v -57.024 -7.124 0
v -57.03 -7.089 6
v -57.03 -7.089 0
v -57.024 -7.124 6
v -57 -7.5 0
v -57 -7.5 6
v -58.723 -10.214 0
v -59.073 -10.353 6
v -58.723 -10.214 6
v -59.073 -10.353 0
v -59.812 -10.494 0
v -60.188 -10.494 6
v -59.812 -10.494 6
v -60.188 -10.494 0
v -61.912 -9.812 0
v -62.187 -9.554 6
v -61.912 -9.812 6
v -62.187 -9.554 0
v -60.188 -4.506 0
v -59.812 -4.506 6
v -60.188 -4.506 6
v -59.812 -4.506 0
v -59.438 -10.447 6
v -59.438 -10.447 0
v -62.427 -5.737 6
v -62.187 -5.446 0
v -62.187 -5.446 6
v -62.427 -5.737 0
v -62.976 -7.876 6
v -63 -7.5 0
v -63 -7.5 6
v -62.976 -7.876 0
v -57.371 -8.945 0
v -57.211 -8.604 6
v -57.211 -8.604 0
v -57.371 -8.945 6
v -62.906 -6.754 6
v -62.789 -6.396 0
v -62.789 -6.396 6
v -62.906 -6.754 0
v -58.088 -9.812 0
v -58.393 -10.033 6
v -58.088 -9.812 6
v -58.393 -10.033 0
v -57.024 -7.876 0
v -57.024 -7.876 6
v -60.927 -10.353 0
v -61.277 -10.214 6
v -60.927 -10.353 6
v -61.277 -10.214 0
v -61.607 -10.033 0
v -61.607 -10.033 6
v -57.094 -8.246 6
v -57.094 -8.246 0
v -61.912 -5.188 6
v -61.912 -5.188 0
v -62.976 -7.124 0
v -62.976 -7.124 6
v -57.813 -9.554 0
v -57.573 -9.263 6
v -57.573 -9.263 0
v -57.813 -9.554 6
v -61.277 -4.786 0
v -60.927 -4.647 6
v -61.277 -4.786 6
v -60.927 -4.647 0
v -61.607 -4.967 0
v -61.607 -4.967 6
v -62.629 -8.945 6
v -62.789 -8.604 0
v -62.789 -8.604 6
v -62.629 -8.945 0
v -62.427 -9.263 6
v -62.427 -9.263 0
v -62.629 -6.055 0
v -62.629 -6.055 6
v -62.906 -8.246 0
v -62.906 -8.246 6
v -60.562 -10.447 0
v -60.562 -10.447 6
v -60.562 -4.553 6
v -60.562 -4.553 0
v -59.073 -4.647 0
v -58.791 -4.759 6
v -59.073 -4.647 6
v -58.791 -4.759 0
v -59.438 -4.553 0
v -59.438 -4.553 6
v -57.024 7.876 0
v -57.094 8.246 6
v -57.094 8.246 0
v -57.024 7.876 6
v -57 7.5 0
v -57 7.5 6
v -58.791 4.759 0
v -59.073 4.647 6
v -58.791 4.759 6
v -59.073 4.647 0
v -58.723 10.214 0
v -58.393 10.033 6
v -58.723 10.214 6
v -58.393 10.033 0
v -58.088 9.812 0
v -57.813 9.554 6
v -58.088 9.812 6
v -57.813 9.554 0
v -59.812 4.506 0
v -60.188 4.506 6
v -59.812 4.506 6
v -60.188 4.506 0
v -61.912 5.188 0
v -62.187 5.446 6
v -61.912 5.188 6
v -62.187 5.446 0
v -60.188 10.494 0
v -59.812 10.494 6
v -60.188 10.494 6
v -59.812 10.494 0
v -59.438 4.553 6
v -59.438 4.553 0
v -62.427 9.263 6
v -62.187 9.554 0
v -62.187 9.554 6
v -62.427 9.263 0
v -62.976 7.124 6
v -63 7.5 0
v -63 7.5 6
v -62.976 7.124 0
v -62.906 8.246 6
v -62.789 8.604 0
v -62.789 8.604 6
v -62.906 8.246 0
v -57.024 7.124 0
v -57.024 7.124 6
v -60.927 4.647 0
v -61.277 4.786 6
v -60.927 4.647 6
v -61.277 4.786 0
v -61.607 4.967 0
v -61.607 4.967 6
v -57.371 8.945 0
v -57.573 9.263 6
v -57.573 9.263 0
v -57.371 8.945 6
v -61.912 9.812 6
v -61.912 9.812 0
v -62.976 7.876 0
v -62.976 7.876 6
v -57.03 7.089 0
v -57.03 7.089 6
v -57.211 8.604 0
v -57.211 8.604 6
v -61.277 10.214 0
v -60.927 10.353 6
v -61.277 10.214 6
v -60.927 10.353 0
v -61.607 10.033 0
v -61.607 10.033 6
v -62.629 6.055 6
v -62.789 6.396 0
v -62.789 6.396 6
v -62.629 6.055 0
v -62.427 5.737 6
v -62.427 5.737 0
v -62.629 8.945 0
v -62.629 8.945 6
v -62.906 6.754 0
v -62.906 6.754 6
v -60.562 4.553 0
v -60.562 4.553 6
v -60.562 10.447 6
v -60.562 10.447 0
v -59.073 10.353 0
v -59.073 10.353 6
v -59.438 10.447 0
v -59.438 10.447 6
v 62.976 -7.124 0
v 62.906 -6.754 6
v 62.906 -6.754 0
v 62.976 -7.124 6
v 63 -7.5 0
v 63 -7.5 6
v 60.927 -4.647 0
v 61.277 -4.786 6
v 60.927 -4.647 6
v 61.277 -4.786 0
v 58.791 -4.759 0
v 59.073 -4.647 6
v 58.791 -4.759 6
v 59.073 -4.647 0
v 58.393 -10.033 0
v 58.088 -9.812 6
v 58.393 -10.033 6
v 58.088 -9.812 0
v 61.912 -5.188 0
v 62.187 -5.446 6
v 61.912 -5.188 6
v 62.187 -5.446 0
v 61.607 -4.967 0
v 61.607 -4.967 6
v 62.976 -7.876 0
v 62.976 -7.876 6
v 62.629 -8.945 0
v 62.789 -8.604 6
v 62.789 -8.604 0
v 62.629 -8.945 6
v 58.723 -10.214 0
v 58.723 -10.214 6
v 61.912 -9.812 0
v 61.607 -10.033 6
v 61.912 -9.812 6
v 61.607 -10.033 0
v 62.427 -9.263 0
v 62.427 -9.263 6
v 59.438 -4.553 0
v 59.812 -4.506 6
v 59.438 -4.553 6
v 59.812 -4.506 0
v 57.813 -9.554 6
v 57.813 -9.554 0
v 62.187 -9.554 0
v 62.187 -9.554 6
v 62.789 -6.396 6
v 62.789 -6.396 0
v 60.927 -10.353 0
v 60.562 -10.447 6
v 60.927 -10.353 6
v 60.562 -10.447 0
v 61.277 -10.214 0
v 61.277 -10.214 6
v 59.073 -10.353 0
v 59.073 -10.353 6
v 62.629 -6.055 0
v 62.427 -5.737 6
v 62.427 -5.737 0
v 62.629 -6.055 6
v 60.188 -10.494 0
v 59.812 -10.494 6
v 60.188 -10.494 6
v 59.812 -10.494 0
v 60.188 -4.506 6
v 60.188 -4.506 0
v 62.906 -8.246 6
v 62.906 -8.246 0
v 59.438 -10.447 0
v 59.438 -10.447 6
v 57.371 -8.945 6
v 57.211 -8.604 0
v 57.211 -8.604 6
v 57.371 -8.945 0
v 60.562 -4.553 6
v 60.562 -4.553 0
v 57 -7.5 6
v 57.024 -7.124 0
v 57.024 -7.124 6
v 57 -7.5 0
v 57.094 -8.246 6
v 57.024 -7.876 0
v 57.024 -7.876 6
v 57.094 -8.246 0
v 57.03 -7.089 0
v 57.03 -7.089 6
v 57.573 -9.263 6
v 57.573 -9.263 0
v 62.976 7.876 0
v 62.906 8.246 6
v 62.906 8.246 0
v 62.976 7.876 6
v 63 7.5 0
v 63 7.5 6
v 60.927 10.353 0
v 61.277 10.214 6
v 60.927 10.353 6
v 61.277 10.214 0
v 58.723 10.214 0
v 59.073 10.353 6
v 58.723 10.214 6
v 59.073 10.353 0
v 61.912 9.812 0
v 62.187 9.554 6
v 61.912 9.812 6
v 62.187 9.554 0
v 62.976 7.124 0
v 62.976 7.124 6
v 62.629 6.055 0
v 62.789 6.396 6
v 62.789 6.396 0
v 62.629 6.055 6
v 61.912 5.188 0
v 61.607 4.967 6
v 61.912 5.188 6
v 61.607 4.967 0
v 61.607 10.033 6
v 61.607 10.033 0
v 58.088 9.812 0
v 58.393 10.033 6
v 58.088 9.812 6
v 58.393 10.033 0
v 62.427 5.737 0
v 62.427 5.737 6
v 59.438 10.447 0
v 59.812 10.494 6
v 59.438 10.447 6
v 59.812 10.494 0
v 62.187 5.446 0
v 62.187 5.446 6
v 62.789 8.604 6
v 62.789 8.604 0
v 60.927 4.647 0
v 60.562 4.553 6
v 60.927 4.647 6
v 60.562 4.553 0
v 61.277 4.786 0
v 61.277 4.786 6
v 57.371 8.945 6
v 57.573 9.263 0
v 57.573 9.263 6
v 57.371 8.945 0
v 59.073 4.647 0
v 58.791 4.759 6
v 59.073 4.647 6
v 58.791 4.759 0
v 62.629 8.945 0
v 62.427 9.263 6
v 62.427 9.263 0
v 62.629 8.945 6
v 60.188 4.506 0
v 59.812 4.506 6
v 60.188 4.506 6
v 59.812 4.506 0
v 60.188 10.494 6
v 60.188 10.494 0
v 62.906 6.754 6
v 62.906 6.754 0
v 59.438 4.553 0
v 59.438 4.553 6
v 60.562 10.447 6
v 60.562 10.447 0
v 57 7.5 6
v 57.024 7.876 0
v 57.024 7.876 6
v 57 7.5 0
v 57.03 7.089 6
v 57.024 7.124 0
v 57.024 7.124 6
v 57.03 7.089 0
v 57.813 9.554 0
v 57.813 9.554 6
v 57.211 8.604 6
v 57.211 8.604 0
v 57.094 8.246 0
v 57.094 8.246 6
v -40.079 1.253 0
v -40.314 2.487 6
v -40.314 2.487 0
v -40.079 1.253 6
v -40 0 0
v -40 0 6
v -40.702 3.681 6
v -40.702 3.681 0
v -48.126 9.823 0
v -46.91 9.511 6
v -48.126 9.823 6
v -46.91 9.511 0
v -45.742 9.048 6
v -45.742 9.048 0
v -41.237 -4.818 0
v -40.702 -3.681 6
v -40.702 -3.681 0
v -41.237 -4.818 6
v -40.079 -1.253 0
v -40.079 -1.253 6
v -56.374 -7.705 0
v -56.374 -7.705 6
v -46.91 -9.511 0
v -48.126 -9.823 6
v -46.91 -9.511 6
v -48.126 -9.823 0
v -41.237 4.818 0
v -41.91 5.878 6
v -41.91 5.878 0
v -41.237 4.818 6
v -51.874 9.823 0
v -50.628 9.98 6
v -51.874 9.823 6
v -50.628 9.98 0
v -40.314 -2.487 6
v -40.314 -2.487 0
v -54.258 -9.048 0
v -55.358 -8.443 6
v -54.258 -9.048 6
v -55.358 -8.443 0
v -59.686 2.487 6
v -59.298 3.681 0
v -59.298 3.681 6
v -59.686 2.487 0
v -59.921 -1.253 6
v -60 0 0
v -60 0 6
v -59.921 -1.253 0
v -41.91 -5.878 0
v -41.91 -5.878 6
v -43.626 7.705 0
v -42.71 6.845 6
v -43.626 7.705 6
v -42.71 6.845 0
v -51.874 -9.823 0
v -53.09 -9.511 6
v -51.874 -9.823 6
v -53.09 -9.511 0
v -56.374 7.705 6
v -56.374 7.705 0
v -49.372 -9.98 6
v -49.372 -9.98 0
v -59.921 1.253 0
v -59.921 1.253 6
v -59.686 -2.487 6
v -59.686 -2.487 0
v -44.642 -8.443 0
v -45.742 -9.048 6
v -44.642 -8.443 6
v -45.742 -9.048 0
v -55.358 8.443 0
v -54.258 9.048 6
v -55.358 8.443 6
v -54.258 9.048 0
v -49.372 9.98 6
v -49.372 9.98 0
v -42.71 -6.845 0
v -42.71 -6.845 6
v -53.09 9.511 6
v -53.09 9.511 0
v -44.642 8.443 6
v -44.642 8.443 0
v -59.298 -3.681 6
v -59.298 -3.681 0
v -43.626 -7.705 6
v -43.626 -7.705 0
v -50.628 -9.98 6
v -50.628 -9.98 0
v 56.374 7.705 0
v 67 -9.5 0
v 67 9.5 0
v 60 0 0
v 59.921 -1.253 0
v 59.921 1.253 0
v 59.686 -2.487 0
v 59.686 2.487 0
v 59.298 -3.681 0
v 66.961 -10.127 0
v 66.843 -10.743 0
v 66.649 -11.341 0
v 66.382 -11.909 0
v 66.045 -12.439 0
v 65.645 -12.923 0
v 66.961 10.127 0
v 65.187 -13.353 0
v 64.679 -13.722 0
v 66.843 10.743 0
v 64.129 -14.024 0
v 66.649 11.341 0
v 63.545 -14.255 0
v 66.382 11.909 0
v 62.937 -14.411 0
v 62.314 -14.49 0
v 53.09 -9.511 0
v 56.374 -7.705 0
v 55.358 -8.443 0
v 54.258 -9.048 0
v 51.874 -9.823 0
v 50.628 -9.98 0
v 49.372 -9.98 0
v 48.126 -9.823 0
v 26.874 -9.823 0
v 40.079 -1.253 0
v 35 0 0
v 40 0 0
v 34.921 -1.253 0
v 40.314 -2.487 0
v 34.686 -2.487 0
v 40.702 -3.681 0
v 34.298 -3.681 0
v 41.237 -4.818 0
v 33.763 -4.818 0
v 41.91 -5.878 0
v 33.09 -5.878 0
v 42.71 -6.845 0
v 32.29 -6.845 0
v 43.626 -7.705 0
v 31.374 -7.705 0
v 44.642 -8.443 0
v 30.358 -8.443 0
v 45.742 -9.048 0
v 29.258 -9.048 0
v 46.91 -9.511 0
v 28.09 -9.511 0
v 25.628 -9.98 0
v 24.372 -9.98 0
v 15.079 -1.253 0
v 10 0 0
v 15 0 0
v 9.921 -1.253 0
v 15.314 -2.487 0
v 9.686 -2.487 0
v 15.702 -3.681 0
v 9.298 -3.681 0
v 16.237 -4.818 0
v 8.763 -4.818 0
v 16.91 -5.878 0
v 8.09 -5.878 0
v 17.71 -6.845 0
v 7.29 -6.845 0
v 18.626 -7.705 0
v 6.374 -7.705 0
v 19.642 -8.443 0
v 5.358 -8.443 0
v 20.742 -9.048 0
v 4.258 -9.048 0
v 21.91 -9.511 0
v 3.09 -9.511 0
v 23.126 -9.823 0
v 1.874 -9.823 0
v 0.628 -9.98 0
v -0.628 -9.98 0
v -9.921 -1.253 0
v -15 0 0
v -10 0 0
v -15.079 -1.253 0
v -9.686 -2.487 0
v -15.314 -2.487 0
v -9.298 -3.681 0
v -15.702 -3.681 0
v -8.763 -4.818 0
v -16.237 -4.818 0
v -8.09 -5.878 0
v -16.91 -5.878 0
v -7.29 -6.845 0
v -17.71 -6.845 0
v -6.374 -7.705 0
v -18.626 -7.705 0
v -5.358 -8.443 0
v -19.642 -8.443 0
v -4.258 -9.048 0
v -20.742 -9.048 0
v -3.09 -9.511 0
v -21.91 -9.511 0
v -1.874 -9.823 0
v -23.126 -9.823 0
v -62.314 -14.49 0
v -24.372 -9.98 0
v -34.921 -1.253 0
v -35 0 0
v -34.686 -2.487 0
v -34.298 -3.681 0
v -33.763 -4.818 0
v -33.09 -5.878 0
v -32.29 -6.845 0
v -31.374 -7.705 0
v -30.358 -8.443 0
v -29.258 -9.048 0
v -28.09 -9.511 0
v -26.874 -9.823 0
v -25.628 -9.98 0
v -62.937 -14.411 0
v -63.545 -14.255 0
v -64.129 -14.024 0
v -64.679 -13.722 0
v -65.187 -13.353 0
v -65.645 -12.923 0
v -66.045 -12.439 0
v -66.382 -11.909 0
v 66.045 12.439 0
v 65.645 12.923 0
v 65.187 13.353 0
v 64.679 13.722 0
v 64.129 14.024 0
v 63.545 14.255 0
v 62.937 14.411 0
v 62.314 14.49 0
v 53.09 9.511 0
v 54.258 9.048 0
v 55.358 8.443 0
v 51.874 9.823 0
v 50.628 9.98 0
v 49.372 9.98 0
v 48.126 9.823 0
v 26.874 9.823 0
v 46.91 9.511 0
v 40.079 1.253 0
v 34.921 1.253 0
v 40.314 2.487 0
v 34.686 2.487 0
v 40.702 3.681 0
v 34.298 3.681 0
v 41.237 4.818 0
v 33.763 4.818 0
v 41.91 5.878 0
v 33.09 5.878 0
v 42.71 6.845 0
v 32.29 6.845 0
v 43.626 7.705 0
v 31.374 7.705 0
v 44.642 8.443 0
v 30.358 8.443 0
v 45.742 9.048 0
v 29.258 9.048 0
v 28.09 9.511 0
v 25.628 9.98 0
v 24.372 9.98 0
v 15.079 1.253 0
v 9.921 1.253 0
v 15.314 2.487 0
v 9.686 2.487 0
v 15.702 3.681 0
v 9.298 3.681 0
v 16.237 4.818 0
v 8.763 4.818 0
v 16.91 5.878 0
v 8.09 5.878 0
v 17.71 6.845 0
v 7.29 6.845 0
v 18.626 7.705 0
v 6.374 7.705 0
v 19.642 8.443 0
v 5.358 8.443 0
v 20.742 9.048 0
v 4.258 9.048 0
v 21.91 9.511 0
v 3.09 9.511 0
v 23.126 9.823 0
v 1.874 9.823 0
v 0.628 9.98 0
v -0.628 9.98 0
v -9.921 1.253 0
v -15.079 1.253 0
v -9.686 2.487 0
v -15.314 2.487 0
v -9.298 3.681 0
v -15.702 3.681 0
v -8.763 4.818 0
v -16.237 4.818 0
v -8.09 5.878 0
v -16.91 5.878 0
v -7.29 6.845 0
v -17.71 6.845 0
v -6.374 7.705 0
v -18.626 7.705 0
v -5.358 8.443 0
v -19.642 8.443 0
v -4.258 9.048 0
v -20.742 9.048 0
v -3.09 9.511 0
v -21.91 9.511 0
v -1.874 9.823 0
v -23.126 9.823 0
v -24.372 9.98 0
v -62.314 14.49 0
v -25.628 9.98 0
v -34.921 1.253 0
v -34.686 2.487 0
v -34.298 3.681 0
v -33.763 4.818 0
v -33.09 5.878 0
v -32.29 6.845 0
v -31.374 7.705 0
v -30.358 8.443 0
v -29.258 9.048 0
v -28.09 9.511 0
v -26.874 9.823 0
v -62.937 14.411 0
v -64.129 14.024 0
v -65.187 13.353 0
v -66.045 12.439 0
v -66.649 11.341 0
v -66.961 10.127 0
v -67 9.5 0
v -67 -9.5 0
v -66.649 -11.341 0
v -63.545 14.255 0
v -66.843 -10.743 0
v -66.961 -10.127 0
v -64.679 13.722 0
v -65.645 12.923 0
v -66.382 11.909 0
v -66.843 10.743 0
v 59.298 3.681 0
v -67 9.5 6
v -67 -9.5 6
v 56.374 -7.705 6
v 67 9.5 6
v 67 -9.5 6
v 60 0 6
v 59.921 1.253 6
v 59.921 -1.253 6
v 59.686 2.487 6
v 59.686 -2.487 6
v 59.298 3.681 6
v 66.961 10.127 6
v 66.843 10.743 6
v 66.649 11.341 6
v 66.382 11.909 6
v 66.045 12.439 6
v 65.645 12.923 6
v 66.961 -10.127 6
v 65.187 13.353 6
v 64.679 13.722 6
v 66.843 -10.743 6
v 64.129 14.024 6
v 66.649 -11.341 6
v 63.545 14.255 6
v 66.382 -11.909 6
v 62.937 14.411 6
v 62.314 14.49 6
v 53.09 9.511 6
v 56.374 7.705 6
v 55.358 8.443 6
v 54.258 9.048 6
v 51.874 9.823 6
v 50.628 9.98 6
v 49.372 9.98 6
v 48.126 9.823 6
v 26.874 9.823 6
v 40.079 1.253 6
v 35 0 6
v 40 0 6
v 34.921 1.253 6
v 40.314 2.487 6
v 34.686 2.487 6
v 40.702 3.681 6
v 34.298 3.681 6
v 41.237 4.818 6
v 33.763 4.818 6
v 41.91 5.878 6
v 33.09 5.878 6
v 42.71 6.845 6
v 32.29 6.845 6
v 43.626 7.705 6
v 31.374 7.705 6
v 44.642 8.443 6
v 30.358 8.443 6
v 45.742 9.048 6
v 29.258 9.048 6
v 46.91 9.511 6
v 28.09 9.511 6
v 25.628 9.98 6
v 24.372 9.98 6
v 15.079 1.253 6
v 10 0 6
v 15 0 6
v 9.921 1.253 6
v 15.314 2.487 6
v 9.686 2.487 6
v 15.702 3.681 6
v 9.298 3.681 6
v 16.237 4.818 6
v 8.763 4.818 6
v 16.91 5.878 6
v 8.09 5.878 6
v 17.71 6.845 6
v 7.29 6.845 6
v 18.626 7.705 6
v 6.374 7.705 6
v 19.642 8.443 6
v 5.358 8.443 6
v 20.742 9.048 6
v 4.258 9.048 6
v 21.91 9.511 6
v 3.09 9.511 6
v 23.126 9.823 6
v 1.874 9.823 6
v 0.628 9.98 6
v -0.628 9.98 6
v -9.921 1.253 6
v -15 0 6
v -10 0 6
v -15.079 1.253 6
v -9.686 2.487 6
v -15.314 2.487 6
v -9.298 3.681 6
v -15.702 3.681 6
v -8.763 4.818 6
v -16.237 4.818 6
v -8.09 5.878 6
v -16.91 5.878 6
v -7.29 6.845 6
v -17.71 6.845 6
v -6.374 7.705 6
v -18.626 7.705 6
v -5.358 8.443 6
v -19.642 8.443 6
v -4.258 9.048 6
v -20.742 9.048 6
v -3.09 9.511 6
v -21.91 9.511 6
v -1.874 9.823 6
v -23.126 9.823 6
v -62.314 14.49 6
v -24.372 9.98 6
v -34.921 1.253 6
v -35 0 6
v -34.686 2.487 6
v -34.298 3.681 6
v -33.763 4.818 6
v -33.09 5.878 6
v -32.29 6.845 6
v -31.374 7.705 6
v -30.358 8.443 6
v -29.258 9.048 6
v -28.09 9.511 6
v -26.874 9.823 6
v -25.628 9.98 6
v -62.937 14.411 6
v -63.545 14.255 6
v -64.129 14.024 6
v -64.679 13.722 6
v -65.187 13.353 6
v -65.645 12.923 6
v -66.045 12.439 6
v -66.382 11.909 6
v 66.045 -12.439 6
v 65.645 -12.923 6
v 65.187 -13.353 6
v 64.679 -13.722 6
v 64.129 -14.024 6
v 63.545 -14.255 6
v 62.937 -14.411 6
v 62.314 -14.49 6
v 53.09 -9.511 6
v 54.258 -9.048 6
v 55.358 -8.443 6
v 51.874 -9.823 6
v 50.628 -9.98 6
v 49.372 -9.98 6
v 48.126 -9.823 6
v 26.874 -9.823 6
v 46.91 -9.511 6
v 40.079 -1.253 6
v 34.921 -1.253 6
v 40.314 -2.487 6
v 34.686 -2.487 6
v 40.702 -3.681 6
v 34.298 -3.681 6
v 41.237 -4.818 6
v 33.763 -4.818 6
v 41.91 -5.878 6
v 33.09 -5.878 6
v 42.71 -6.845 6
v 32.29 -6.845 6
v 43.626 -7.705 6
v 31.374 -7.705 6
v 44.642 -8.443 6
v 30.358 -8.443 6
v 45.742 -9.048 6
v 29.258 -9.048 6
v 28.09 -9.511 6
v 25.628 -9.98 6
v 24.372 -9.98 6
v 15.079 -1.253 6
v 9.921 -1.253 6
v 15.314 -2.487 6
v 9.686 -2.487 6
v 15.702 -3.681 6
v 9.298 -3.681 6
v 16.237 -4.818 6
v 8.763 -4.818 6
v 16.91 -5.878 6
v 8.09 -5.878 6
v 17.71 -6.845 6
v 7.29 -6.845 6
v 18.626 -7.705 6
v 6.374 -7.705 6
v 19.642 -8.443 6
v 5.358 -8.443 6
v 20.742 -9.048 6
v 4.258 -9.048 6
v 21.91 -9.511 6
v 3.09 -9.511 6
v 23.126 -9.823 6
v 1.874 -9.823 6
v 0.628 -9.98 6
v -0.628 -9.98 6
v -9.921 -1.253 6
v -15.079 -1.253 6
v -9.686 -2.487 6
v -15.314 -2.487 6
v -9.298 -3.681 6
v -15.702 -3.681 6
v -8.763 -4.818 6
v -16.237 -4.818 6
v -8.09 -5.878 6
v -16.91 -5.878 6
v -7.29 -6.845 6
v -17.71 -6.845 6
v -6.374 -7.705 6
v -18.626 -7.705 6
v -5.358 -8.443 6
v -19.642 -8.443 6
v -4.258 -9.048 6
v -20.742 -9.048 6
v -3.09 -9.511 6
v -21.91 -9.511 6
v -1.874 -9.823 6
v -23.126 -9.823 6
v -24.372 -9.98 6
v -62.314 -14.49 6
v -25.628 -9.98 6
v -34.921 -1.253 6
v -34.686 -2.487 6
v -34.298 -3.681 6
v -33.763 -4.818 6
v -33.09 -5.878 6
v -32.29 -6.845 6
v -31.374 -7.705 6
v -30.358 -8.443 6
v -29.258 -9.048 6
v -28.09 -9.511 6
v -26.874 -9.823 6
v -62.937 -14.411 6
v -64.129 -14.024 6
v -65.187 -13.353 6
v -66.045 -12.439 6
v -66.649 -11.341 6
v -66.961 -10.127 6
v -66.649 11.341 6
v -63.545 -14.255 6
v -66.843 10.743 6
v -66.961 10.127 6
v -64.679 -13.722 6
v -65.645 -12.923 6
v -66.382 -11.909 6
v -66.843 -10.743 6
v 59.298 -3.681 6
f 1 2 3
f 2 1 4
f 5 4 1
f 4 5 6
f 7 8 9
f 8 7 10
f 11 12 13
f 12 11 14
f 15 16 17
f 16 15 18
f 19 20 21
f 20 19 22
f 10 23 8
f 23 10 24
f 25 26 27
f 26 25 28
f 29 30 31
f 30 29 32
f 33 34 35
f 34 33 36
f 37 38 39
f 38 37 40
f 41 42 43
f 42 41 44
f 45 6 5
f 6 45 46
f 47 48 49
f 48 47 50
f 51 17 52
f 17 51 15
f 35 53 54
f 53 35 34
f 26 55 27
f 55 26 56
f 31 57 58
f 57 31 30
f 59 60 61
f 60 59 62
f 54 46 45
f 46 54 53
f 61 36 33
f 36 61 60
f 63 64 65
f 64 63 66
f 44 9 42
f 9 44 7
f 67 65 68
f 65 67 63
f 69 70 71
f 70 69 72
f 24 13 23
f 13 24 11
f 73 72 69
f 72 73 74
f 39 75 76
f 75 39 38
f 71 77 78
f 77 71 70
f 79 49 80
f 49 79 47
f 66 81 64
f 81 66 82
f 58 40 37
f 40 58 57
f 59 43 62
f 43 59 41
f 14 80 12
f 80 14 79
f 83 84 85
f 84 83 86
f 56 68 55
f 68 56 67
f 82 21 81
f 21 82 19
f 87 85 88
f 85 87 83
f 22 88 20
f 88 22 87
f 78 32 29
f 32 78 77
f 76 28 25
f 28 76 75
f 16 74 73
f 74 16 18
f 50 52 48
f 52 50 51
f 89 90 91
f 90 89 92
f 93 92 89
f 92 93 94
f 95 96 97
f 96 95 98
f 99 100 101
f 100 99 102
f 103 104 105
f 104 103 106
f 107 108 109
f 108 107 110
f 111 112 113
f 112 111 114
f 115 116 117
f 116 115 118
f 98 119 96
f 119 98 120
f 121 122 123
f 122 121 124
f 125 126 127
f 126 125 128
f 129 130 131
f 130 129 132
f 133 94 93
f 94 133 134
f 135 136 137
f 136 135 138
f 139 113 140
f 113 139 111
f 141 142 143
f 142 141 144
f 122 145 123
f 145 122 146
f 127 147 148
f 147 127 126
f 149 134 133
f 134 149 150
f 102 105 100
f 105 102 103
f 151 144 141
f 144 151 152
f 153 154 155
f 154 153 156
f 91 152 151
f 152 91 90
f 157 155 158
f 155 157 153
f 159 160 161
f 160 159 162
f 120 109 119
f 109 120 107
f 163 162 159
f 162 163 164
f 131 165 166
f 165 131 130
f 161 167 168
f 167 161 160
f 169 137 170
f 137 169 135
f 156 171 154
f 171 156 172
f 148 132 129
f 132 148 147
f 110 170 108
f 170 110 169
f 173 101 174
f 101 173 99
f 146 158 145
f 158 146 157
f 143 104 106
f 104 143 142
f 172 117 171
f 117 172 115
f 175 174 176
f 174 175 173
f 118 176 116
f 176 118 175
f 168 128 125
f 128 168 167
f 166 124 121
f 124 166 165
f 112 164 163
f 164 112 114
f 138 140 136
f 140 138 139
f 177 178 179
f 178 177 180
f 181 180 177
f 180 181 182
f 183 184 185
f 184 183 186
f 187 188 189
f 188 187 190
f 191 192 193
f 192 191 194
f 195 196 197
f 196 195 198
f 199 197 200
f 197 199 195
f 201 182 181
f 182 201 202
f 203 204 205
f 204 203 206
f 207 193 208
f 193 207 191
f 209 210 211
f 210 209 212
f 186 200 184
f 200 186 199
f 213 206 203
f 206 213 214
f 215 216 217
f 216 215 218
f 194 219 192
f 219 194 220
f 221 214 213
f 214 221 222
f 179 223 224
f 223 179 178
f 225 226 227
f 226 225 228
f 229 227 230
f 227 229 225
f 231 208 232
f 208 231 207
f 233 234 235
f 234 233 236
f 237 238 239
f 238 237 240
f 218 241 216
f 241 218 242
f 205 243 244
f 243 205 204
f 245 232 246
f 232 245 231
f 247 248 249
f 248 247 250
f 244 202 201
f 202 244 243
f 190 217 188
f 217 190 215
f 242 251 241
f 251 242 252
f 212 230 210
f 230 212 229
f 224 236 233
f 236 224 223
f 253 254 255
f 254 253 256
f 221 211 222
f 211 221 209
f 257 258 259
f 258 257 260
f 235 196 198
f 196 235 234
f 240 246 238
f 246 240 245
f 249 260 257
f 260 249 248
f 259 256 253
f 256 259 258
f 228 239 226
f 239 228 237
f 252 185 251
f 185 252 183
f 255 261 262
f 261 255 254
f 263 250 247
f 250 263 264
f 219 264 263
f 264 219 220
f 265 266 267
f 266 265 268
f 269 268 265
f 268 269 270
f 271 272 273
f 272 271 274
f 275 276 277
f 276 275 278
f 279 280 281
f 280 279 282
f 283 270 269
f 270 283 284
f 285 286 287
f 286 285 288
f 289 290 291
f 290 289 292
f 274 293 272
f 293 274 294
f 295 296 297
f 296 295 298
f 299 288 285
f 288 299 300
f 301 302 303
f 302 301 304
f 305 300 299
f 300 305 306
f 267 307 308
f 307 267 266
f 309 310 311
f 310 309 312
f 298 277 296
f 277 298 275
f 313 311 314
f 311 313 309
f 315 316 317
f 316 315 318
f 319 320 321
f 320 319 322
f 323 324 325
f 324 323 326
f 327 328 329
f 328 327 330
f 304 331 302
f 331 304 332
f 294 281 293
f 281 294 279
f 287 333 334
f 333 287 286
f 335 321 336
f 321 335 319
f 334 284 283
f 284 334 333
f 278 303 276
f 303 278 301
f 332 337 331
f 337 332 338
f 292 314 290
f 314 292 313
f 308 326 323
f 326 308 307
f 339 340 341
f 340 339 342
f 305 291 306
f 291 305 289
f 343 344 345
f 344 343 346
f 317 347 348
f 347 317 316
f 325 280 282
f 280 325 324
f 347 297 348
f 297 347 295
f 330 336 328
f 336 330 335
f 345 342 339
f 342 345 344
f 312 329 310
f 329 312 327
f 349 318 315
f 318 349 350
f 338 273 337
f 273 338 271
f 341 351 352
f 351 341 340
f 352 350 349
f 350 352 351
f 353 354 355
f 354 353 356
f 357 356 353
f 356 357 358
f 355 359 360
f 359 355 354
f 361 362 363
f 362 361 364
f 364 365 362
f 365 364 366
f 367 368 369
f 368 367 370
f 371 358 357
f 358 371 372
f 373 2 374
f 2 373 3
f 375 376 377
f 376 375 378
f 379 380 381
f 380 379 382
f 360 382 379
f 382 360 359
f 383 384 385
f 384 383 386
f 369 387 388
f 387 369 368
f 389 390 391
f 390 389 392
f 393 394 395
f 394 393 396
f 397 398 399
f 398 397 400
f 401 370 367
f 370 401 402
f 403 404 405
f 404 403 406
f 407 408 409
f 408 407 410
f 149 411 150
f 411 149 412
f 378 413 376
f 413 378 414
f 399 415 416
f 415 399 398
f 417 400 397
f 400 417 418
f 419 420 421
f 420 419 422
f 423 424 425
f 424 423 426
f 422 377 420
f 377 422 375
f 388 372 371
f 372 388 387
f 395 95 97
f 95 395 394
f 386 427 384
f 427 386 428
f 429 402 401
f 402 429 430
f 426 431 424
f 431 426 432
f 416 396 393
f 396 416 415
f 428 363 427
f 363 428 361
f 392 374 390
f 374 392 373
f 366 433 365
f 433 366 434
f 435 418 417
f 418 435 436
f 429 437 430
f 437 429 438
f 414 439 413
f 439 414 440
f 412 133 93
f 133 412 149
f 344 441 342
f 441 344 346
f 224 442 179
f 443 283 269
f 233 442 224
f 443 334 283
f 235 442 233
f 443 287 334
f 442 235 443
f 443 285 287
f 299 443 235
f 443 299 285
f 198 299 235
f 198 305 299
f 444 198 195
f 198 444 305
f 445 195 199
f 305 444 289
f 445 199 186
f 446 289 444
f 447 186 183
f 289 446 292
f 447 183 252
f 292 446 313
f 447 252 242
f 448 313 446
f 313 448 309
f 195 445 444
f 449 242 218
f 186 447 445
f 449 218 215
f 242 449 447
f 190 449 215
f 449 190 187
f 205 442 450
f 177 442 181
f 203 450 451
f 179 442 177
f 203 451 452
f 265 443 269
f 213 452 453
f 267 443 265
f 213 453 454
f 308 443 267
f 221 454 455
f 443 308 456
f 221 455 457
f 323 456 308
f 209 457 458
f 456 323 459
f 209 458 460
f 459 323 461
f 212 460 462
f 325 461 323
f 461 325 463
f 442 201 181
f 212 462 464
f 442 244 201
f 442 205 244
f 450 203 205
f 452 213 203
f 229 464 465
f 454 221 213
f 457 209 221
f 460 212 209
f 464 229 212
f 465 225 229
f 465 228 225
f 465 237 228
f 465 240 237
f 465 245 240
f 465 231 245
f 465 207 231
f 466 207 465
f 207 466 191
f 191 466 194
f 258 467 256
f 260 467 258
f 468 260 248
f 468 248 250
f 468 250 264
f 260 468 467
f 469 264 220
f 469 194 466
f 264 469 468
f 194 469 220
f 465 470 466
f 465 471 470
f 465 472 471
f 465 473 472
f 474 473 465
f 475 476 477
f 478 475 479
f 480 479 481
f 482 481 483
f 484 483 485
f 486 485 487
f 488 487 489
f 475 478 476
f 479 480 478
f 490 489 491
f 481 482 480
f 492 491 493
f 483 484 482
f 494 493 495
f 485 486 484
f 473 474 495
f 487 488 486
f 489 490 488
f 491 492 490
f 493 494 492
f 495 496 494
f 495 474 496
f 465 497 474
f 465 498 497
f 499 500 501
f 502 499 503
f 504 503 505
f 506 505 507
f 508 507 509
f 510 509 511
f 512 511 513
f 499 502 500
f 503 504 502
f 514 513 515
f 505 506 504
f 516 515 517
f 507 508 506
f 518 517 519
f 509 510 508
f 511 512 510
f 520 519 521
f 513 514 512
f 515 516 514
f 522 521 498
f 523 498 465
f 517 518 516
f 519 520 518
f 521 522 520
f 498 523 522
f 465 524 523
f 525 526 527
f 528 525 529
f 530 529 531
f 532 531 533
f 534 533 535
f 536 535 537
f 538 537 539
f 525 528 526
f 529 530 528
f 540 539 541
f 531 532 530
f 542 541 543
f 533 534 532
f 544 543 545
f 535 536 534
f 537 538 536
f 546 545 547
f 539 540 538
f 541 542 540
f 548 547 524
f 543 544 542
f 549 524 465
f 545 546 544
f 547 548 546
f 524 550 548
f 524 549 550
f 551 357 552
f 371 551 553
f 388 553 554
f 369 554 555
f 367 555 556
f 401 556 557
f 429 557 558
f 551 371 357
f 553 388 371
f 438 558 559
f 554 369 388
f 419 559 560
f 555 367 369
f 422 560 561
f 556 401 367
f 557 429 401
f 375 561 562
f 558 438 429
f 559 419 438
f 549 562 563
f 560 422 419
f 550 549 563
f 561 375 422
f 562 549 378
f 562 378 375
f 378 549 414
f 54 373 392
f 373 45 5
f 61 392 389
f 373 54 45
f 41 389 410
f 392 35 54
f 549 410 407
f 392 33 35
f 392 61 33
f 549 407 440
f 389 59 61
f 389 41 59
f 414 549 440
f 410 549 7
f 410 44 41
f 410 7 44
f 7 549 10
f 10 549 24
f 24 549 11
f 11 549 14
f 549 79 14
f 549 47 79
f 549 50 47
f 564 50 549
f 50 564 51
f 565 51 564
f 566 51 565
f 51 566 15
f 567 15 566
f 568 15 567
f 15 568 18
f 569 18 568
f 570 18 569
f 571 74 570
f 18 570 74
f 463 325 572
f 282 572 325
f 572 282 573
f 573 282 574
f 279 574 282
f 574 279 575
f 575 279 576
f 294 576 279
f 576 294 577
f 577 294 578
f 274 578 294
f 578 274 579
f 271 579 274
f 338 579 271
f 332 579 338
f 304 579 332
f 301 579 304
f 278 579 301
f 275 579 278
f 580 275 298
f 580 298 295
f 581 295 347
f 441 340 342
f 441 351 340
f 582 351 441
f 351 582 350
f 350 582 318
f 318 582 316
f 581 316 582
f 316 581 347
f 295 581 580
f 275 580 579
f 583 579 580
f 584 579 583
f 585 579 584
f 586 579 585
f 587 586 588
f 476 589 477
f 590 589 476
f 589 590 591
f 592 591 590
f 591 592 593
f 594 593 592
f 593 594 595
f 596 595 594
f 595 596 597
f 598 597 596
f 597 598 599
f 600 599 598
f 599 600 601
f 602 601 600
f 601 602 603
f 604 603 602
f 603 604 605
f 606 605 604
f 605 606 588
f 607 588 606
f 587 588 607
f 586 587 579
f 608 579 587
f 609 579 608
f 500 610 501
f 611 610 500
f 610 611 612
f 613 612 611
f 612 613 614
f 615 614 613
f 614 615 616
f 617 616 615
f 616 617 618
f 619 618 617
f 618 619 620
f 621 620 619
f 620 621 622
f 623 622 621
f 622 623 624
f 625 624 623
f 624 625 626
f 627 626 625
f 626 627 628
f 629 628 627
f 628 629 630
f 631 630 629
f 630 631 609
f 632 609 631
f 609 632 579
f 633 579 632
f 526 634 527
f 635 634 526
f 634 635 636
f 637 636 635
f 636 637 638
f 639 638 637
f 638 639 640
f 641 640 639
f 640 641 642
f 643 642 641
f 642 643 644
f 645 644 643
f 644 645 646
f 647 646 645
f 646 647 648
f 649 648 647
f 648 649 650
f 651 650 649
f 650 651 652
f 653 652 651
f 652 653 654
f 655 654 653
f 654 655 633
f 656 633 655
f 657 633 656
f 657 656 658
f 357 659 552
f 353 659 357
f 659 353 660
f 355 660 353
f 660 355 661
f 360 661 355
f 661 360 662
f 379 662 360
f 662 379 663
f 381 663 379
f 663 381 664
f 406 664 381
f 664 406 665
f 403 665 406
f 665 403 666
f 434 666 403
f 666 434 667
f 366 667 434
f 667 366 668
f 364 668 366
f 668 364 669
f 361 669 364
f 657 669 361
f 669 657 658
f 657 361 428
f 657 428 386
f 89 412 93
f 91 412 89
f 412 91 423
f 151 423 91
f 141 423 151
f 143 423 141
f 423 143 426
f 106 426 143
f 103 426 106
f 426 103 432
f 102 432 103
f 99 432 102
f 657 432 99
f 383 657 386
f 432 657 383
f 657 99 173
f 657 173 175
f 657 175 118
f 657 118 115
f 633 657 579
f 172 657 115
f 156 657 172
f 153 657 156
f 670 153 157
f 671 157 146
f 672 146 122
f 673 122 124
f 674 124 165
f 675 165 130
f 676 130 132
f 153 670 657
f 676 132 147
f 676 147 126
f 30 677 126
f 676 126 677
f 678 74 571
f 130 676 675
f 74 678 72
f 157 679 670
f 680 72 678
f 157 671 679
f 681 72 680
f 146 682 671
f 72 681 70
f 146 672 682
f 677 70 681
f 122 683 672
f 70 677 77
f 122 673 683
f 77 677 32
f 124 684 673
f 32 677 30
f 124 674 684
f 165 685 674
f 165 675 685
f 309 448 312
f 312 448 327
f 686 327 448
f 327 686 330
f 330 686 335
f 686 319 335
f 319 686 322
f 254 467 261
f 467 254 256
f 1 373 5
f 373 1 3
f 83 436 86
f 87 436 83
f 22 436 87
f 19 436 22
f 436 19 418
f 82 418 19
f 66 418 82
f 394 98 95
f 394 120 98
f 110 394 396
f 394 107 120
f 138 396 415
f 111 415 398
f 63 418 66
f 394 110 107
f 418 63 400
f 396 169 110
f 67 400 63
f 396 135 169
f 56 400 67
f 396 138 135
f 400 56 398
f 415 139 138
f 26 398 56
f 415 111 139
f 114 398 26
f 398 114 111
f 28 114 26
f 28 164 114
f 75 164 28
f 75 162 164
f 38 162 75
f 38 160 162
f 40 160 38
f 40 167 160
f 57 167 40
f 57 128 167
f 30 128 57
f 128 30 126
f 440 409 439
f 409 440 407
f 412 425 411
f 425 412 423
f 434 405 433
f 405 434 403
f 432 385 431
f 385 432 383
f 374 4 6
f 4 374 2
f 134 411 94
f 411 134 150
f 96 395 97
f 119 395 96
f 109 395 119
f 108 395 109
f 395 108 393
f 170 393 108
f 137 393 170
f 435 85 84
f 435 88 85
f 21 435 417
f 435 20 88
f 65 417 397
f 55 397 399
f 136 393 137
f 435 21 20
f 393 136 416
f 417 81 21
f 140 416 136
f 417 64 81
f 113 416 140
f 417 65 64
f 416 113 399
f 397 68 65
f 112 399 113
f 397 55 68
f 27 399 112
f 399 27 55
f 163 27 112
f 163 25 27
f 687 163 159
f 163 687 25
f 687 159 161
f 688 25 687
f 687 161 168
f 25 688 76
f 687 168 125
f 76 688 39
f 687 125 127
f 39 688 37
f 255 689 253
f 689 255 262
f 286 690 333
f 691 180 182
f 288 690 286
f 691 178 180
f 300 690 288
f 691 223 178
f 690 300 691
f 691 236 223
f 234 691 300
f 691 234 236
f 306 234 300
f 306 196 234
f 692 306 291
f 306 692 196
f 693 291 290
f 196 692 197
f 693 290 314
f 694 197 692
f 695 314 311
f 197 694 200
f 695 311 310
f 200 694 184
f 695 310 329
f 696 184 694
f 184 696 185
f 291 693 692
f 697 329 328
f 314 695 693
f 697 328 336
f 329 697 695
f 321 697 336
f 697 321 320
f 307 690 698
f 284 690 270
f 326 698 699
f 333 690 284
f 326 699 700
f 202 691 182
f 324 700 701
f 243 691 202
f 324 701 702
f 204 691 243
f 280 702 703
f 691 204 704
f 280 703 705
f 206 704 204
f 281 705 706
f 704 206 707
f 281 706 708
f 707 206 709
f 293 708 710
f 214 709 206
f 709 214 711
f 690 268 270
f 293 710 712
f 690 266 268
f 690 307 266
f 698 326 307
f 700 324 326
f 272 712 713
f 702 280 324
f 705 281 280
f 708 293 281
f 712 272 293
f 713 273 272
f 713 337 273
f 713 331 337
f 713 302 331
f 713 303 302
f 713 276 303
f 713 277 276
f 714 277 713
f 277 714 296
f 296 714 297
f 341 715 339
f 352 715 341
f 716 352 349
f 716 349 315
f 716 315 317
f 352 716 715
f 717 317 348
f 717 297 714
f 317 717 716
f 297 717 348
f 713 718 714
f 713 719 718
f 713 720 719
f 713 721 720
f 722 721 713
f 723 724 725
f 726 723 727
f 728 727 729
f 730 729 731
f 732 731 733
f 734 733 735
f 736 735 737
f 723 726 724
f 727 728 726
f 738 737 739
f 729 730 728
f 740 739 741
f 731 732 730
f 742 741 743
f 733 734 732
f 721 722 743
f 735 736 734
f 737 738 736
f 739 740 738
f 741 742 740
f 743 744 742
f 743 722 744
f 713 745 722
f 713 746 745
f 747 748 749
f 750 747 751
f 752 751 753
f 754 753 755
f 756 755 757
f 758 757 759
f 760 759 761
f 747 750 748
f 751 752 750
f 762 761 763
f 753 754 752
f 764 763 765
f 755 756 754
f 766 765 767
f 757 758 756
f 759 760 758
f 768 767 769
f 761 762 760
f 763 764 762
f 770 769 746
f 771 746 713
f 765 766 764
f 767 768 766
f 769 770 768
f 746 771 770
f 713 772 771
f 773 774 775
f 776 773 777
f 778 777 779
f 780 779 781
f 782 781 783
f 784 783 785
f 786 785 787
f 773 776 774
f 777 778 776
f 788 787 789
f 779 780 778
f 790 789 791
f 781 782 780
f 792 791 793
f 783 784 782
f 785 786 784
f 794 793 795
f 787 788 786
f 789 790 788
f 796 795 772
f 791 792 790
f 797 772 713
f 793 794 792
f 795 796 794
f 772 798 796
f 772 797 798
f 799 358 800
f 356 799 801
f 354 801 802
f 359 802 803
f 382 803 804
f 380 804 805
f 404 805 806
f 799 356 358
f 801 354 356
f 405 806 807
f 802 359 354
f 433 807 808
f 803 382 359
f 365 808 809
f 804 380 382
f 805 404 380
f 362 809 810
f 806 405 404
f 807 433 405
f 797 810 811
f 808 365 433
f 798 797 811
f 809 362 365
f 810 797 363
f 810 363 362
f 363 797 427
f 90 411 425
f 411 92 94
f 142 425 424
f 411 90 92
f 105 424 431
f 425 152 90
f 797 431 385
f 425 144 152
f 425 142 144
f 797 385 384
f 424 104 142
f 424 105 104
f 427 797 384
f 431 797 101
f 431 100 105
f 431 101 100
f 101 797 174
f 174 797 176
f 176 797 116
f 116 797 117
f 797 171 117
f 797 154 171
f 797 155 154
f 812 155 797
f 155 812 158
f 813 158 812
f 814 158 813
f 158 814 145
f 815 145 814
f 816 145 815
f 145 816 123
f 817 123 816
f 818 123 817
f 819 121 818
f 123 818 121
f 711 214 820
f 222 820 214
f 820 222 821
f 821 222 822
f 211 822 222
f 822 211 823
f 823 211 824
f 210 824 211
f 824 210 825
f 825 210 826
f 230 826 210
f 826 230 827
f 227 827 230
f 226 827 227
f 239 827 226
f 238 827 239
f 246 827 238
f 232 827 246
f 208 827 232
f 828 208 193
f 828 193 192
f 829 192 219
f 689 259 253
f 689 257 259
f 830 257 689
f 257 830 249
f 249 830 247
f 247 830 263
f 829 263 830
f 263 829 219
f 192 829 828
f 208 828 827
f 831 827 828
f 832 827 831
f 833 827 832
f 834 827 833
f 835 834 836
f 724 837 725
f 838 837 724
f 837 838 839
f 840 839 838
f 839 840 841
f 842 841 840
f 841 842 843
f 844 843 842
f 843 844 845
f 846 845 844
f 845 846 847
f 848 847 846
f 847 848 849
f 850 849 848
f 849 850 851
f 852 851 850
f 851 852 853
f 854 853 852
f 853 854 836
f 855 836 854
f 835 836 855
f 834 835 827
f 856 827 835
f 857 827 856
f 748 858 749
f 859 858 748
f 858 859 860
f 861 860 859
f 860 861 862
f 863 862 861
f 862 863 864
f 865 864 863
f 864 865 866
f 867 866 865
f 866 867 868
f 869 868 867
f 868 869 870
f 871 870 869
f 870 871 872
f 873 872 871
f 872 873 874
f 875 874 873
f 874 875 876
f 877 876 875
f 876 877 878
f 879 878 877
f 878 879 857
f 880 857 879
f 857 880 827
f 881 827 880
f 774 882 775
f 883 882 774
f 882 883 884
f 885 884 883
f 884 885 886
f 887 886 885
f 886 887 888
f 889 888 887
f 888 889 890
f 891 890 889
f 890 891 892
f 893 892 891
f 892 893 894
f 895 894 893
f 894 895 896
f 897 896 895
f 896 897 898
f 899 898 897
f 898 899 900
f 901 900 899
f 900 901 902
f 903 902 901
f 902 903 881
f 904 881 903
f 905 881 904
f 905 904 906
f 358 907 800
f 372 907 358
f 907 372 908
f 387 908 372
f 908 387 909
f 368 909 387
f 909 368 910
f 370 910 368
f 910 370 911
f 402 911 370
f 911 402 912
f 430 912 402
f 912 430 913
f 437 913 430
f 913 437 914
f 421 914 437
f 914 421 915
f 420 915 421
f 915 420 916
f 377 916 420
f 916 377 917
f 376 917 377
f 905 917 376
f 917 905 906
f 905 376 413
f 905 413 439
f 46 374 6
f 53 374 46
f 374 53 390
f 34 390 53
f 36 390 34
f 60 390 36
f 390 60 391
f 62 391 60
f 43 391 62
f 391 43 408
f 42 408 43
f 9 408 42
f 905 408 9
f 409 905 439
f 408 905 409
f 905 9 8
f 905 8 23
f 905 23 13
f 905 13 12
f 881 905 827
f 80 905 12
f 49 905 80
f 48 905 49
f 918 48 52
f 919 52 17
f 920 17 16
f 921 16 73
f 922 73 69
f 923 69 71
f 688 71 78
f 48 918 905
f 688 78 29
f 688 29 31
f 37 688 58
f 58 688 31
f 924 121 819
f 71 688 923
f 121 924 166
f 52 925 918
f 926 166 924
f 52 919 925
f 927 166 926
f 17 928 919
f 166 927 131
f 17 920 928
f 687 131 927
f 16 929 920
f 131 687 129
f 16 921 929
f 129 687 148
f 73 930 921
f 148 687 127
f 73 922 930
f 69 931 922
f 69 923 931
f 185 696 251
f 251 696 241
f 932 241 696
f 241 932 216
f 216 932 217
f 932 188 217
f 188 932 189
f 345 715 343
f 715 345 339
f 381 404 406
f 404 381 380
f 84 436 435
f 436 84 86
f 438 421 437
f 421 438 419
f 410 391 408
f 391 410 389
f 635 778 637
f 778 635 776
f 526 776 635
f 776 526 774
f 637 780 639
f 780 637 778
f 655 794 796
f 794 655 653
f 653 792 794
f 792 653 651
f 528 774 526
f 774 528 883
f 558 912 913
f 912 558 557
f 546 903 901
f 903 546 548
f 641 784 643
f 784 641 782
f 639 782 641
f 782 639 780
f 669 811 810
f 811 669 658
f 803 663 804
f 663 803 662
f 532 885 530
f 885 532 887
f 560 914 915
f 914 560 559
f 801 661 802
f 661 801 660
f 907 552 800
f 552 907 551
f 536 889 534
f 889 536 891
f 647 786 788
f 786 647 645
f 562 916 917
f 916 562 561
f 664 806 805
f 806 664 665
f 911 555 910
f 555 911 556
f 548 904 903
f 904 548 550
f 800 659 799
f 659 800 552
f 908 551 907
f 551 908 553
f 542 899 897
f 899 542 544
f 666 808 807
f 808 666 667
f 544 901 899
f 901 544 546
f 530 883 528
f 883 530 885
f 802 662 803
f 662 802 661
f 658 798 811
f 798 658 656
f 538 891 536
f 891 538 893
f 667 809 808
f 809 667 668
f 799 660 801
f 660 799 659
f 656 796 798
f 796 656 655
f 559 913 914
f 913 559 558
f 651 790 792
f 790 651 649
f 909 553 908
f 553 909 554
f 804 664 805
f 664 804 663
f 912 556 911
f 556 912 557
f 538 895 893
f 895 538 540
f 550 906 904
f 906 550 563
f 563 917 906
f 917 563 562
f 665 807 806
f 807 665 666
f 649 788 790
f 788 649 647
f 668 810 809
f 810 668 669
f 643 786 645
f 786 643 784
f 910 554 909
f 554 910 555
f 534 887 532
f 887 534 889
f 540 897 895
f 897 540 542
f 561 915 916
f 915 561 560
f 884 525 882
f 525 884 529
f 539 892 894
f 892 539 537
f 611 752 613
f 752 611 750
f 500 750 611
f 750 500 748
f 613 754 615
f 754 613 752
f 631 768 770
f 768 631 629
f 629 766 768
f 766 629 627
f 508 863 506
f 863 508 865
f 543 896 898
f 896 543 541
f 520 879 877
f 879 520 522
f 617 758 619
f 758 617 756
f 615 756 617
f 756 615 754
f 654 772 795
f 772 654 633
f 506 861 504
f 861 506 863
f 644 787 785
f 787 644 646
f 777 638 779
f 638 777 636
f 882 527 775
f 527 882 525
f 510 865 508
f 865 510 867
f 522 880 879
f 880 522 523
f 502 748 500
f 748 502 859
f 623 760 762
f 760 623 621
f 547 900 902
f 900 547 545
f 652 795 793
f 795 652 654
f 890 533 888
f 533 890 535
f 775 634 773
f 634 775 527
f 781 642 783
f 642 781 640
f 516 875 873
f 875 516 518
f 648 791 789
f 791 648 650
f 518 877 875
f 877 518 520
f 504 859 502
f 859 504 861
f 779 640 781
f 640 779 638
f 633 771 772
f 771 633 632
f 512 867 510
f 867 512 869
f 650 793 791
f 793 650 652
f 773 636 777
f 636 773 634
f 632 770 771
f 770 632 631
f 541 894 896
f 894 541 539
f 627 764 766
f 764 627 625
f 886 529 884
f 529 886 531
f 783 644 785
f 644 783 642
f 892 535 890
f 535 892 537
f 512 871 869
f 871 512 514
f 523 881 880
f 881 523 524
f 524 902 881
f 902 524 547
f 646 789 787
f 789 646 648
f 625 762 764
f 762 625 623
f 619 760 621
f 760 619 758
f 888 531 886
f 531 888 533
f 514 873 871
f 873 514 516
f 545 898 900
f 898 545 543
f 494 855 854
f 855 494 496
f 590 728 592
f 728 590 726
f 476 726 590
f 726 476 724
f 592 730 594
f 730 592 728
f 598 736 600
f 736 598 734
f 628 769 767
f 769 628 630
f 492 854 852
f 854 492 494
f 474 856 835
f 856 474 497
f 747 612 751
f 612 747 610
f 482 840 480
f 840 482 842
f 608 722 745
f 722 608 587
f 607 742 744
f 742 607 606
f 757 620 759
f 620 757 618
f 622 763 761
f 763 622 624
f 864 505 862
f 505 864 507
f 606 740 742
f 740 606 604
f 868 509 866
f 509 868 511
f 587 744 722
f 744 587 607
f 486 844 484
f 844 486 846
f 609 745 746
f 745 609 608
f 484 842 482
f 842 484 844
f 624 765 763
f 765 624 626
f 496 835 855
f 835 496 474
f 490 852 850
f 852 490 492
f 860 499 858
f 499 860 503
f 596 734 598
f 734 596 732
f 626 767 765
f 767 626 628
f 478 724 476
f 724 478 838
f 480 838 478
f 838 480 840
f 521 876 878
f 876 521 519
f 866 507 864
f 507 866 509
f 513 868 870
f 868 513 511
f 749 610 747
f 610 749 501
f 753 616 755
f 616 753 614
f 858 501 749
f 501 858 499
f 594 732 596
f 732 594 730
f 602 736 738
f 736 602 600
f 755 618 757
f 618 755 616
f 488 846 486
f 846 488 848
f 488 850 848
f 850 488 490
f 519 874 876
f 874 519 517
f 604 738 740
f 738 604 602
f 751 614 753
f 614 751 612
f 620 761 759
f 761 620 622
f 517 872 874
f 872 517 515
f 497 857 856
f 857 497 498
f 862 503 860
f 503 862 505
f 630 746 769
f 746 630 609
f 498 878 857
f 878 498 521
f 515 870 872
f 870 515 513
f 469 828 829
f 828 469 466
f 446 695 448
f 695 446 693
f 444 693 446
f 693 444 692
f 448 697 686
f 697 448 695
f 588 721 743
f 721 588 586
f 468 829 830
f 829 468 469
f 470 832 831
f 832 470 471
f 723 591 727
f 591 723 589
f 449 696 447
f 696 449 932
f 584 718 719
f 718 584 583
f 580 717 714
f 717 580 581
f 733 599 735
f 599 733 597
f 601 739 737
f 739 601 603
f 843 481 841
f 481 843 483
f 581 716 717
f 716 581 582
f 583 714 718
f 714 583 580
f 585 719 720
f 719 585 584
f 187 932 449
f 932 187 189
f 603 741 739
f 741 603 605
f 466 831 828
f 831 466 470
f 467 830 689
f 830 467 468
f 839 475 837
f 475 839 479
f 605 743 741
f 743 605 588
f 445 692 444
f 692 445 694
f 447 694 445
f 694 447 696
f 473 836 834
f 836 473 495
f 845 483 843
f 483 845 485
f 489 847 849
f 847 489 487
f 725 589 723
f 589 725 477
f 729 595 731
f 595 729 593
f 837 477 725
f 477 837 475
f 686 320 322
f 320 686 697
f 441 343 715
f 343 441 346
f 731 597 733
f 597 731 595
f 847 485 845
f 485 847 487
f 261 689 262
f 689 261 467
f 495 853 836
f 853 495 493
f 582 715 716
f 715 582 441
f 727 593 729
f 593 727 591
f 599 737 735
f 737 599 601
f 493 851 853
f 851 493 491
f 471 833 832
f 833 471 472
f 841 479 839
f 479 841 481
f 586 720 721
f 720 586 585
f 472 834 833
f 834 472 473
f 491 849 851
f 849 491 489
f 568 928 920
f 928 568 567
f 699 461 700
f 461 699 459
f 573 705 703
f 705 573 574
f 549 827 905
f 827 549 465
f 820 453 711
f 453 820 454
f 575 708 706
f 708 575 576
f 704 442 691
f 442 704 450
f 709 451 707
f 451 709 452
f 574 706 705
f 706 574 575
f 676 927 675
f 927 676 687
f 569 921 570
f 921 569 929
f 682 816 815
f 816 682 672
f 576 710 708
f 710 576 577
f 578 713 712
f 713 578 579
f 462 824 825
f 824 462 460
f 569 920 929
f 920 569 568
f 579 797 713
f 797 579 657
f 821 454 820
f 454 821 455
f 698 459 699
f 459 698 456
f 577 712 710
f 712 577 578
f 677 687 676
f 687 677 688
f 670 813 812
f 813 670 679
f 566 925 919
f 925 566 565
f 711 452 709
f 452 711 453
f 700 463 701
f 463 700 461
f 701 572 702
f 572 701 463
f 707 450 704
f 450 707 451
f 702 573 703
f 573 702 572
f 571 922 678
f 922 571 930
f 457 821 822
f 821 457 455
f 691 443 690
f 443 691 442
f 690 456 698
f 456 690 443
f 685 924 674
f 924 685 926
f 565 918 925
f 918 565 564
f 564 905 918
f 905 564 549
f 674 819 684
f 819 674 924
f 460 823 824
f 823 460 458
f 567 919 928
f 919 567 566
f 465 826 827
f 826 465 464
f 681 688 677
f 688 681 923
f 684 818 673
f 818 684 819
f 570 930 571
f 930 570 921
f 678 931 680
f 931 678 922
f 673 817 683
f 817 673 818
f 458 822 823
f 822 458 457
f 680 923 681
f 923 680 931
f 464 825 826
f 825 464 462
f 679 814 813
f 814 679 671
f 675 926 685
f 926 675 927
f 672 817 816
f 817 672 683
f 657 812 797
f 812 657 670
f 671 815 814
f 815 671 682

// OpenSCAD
$fn = 50;


difference() {
	union() {
		hull() {
			translate(v = [-62.0000000000, 9.5000000000, 0]) {
				cylinder(h = 6, r = 5);
			}
			translate(v = [62.0000000000, 9.5000000000, 0]) {
				cylinder(h = 6, r = 5);
			}
			translate(v = [-62.0000000000, -9.5000000000, 0]) {
				cylinder(h = 6, r = 5);
			}
			translate(v = [62.0000000000, -9.5000000000, 0]) {
				cylinder(h = 6, r = 5);
			}
		}
	}
	union() {
		#translate(v = [-60.0000000000, -7.5000000000, -100.0000000000]) {
			cylinder(h = 200, r = 3.0000000000);
		}
		#translate(v = [-60.0000000000, 7.5000000000, -100.0000000000]) {
			cylinder(h = 200, r = 3.0000000000);
		}
		#translate(v = [60.0000000000, -7.5000000000, -100.0000000000]) {
			cylinder(h = 200, r = 3.0000000000);
		}
		#translate(v = [60.0000000000, 7.5000000000, -100.0000000000]) {
			cylinder(h = 200, r = 3.0000000000);
		}
		#translate(v = [-50.0000000000, 0, 0]) {
			cylinder(h = 6, r = 10.0000000000);
		}
		#translate(v = [-25.0000000000, 0, 0]) {
			cylinder(h = 6, r = 10.0000000000);
		}
		#cylinder(h = 6, r = 10.0000000000);
		#translate(v = [25.0000000000, 0, 0]) {
			cylinder(h = 6, r = 10.0000000000);
		}
		#translate(v = [50.0000000000, 0, 0]) {
			cylinder(h = 6, r = 10.0000000000);
		}
	}
}
